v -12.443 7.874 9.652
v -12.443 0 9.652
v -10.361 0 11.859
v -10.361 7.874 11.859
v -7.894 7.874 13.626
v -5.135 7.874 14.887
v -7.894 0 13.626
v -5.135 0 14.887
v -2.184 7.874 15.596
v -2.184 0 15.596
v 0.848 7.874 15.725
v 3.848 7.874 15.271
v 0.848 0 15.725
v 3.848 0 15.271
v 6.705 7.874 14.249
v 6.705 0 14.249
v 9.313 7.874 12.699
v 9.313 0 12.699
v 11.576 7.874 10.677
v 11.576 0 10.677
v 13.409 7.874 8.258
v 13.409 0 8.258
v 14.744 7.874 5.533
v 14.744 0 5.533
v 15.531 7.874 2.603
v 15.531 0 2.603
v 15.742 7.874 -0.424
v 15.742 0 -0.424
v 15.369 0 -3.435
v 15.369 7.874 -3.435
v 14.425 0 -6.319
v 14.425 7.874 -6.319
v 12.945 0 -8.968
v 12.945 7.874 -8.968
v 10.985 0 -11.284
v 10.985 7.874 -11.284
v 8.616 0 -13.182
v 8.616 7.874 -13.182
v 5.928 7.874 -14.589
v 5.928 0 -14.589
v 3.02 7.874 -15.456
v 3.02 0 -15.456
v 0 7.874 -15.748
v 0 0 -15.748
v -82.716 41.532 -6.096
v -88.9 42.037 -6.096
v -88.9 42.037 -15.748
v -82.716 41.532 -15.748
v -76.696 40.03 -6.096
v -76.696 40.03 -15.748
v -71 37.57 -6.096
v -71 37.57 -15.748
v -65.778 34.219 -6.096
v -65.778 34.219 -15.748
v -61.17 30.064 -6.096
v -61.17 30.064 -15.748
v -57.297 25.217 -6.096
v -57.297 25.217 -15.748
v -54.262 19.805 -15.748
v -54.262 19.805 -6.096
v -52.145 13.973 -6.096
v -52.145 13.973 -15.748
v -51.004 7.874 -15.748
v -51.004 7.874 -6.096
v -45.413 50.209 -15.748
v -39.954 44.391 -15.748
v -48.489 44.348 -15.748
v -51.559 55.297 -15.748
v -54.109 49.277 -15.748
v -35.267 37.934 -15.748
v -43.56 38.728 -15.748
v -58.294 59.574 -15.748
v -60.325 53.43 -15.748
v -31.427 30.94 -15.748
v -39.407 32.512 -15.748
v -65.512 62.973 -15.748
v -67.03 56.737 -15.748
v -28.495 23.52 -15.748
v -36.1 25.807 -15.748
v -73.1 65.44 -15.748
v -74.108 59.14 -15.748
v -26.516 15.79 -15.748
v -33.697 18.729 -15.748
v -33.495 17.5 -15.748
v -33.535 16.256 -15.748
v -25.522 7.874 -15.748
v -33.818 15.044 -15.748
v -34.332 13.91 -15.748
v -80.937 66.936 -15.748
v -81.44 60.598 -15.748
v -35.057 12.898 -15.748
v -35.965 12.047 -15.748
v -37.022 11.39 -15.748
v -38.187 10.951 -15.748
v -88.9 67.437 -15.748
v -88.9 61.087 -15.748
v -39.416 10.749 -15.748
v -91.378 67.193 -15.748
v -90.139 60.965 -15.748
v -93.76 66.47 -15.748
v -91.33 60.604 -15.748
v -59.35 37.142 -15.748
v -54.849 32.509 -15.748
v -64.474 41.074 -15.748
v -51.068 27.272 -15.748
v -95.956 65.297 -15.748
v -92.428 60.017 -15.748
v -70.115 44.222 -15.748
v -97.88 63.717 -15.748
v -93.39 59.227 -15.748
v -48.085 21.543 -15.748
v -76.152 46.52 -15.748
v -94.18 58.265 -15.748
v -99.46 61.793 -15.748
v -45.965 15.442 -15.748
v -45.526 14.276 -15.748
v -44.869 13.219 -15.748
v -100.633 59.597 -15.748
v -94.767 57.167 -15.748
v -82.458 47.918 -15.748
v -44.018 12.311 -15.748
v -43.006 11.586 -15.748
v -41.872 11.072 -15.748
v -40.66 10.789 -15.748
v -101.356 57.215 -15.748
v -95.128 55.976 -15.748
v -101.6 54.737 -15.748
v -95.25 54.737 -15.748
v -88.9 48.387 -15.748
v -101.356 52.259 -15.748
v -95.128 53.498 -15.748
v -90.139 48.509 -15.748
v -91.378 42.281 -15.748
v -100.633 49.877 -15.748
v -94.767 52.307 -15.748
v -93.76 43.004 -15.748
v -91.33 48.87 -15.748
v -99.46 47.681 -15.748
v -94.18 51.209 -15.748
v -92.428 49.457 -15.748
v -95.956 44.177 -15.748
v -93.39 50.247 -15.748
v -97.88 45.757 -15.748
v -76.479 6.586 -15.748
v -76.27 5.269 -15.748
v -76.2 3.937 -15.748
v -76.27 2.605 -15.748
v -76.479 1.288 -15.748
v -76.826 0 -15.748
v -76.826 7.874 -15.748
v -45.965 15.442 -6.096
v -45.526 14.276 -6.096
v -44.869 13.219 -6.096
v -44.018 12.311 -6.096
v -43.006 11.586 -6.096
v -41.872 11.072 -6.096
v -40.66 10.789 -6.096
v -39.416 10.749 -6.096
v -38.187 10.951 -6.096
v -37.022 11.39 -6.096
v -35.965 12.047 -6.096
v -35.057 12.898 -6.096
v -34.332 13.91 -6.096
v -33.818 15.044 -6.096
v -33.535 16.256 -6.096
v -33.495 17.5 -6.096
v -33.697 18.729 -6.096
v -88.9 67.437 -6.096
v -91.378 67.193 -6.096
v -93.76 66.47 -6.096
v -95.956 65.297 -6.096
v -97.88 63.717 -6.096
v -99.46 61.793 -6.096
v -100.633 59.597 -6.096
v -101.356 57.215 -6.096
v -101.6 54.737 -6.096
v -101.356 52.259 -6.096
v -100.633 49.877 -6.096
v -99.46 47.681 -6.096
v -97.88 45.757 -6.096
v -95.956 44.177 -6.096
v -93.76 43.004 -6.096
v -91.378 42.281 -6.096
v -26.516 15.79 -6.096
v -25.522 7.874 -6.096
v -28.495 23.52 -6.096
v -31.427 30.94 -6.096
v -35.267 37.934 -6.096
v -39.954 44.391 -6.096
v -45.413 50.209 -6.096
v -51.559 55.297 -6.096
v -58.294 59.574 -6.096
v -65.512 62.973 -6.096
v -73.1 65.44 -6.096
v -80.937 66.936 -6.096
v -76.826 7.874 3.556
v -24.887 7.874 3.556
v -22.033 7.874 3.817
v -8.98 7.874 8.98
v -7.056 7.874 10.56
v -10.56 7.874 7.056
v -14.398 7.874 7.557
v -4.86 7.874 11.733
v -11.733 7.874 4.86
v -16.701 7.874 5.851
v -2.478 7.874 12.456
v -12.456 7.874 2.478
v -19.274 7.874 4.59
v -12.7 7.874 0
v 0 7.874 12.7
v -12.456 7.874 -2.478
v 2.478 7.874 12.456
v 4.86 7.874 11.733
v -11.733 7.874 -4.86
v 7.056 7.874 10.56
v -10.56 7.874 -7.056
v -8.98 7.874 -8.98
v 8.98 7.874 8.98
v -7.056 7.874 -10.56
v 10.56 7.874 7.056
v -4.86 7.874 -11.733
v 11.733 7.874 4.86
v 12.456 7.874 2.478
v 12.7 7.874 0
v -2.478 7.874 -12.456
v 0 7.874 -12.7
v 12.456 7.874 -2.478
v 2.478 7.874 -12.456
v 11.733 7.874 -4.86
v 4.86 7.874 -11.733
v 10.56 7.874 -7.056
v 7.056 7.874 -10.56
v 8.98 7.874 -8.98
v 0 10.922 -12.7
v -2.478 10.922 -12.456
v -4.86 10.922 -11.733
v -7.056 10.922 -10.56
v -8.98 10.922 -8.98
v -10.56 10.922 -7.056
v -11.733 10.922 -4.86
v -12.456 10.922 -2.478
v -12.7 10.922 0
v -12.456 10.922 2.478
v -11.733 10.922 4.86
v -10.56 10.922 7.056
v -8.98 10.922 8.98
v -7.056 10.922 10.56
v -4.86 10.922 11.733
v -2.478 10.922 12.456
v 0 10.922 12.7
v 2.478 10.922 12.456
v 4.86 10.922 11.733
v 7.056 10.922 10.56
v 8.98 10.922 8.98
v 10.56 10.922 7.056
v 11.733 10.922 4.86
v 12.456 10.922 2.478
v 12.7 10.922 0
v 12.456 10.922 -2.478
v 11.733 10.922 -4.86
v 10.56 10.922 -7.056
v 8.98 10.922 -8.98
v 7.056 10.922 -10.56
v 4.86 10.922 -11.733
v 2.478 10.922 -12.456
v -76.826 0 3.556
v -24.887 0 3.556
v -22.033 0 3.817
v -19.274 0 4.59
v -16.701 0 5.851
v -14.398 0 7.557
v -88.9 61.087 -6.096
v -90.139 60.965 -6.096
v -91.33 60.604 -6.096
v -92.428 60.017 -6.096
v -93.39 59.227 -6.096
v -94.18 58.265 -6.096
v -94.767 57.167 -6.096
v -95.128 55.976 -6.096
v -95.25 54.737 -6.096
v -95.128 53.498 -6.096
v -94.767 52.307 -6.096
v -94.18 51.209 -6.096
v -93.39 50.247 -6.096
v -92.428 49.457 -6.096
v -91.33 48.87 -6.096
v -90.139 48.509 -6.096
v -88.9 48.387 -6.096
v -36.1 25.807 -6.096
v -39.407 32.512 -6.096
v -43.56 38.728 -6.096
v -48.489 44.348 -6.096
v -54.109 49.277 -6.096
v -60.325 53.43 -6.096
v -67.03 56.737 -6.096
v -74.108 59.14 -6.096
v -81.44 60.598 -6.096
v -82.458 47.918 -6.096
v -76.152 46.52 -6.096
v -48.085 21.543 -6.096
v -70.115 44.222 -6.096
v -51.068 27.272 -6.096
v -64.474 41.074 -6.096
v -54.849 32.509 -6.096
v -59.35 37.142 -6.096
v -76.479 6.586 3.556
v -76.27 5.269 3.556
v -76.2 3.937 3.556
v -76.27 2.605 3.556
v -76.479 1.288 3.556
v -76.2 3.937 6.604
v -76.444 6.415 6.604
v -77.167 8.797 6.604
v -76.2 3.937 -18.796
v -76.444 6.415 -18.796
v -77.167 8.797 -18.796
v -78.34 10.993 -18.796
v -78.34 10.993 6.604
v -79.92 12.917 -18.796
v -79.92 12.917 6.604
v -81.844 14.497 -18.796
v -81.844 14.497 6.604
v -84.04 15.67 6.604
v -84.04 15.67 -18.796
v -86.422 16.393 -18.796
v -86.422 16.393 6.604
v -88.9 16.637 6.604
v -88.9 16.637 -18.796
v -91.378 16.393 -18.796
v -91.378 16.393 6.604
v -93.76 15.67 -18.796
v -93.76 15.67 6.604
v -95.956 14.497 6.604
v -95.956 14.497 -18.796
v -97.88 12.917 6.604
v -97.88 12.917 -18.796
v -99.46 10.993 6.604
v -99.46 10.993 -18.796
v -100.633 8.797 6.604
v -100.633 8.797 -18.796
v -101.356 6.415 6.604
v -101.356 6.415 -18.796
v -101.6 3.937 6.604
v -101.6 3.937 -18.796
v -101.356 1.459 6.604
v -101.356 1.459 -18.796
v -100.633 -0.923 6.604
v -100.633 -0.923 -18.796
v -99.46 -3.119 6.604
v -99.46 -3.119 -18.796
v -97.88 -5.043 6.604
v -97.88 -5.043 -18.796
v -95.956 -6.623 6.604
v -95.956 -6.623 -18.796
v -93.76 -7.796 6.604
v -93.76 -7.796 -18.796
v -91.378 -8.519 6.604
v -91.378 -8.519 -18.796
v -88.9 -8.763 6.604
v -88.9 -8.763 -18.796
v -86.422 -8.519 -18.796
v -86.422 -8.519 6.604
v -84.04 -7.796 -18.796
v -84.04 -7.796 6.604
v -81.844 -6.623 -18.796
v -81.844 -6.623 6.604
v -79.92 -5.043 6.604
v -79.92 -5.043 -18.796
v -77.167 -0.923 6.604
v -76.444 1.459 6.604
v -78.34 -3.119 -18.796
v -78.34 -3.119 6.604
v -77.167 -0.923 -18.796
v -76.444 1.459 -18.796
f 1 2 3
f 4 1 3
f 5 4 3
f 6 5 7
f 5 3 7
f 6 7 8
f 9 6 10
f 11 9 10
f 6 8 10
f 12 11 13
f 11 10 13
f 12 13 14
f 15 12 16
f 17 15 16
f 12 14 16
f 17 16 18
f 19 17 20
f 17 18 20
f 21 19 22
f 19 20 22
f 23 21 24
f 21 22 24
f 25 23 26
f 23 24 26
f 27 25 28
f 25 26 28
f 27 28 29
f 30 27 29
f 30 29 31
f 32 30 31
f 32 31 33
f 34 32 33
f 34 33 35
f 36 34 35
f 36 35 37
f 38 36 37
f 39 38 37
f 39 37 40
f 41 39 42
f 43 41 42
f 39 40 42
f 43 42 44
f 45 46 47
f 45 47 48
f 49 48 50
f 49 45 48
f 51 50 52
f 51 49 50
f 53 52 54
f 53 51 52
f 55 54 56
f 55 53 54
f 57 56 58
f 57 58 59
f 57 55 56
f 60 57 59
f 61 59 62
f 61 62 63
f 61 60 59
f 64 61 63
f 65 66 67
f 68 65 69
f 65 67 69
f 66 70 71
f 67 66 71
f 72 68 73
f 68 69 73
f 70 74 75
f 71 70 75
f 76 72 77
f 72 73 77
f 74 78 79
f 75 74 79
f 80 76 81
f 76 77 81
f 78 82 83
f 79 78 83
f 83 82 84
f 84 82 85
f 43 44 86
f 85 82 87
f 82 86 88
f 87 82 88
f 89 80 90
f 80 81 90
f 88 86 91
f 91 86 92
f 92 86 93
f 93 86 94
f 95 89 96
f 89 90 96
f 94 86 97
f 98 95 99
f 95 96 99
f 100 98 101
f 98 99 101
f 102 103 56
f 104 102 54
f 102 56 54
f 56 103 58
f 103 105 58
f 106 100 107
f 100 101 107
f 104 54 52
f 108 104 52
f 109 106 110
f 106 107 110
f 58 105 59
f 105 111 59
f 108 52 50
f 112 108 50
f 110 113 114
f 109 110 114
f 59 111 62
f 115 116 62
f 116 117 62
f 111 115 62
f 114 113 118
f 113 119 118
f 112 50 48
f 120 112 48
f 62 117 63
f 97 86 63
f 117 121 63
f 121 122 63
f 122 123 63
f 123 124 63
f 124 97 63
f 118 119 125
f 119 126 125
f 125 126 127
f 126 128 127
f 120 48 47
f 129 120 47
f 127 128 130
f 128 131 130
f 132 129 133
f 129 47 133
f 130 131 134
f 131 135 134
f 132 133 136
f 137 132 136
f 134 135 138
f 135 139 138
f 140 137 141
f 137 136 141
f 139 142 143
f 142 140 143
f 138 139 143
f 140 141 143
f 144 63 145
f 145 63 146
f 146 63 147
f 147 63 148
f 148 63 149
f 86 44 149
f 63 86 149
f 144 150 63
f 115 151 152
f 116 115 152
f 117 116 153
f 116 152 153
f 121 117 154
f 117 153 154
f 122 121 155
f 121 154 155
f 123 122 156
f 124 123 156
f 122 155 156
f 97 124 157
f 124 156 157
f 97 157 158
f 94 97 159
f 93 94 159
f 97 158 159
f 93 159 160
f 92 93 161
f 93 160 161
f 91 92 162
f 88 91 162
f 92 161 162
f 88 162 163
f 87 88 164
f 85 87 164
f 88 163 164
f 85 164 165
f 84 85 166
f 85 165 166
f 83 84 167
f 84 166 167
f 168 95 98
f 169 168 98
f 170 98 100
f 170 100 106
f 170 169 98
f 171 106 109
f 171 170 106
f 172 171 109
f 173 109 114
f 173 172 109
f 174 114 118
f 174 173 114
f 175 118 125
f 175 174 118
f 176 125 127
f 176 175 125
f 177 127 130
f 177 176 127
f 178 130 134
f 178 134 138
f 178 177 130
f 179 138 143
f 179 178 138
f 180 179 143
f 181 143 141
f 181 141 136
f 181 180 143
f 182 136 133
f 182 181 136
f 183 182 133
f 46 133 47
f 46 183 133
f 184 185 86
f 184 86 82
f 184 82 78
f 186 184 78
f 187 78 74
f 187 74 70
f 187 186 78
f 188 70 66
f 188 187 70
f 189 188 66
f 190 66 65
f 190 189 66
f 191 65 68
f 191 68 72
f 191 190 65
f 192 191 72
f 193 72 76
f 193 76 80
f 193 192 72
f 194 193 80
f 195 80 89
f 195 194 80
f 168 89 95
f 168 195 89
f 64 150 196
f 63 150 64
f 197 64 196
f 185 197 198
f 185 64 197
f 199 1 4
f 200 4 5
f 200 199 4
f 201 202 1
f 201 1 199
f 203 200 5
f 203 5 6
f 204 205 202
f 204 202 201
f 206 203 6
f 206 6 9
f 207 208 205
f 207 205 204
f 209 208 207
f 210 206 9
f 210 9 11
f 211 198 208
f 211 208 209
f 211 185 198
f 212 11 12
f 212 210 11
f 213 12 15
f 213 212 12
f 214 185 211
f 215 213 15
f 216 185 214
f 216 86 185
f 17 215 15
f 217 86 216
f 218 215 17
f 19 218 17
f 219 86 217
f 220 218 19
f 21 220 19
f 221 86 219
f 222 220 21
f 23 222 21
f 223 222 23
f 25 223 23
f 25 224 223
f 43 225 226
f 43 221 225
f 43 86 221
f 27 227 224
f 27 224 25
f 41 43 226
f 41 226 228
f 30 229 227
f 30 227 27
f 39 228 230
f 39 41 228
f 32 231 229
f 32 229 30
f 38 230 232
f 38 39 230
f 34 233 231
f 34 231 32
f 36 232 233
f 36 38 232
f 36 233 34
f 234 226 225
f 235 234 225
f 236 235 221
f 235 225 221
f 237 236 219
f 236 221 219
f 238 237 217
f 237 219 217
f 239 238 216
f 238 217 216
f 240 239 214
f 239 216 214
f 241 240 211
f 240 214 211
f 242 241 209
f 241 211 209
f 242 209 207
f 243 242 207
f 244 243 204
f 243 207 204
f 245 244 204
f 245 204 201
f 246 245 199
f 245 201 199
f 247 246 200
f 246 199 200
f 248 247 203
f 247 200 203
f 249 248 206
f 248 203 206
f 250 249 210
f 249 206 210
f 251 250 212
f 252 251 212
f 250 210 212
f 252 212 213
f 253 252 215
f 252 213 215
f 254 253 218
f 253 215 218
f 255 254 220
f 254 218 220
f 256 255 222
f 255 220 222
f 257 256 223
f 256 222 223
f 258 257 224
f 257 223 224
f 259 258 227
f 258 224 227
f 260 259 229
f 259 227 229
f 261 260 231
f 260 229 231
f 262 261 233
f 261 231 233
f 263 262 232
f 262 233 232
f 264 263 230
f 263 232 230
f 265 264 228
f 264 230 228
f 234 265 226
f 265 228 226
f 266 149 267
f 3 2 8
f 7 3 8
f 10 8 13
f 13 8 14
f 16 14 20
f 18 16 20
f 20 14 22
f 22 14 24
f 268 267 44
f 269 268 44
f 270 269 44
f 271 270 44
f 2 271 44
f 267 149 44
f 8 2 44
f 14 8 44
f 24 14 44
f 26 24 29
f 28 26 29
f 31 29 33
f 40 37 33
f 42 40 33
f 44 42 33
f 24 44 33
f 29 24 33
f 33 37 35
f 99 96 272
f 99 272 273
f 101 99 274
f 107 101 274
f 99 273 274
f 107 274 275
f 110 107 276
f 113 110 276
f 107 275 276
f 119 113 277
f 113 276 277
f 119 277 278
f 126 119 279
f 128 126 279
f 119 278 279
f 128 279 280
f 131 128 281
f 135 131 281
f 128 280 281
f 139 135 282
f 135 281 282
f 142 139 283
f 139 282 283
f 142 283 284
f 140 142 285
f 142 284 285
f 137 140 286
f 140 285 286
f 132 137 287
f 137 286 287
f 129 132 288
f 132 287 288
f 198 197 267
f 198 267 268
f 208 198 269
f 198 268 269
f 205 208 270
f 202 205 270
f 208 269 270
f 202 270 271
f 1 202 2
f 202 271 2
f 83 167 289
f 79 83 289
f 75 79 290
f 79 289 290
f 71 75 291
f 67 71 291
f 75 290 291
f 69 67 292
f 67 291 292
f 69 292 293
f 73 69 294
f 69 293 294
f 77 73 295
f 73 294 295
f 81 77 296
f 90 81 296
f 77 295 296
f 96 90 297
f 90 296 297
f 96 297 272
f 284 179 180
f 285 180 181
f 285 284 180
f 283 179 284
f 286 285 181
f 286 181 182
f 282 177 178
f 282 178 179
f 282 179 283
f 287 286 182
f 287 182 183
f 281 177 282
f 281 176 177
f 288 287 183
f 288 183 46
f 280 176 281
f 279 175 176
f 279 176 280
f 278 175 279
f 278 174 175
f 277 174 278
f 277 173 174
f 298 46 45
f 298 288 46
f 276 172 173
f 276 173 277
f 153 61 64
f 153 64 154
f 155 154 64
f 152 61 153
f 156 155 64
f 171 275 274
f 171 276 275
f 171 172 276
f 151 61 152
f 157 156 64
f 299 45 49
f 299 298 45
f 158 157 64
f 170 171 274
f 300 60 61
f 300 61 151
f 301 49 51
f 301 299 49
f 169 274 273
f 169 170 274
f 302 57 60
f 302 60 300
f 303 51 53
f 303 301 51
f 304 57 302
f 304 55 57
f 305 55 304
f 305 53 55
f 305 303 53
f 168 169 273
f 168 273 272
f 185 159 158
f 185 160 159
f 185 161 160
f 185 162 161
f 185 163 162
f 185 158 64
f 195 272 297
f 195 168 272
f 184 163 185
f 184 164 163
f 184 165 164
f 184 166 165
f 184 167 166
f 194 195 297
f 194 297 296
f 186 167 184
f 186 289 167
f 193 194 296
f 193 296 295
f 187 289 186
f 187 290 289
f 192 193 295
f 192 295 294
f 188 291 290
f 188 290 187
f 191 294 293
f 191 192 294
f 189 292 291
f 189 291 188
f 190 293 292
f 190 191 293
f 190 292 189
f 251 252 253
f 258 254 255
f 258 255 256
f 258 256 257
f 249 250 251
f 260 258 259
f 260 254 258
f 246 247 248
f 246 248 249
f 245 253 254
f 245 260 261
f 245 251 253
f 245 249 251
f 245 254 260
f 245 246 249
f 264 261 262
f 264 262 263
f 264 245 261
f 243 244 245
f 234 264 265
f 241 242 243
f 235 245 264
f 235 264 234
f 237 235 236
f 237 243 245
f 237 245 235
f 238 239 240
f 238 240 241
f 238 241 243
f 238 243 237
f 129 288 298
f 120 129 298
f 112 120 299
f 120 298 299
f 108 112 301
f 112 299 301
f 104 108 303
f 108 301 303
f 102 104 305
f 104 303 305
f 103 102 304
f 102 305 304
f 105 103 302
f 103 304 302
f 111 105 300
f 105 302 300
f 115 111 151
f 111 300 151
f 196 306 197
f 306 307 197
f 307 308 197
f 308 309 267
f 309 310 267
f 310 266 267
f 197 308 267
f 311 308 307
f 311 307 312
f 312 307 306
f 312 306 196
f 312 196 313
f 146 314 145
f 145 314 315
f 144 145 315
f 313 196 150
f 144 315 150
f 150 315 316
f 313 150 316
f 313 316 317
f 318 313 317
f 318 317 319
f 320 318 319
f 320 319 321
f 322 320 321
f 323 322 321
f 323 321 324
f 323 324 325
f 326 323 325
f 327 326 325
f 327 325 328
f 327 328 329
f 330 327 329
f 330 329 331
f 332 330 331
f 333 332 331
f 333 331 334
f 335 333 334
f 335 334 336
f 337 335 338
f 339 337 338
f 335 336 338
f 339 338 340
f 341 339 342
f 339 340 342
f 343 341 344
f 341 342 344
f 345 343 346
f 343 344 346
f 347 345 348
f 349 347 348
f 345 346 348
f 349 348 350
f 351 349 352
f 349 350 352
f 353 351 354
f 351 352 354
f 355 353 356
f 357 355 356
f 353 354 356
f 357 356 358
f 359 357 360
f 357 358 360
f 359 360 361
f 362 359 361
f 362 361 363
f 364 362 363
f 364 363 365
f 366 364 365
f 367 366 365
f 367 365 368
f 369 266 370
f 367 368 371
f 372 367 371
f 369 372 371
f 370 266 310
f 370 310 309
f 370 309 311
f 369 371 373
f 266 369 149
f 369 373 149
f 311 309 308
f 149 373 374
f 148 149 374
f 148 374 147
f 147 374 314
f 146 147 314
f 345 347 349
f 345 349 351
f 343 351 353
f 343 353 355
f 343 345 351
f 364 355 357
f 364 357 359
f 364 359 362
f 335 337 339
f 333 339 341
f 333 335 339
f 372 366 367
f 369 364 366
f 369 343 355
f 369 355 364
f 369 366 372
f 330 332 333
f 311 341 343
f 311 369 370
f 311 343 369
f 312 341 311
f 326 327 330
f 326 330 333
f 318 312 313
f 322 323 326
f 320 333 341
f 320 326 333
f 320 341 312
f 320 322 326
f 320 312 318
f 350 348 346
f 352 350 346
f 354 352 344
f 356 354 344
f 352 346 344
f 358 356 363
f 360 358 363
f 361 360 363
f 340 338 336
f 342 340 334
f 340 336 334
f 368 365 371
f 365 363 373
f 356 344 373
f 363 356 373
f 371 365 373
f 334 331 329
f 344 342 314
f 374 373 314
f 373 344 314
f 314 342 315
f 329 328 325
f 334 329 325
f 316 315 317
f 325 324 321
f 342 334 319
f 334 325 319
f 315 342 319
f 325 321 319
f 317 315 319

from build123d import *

# Parameters (mm, degrees)
SALIENTE_EXTRUIR1_DEPTH      = 7.874
SALIENTE_EXTRUIR2_DEPTH      = 12.7
SALIENTE_EXTRUIR2_DEPTH_BACK = 12.7
CROQUIS4_R                   = 12.7
SALIENTE_EXTRUIR4_DEPTH      = 9.652
CORTAR_EXTRUIR1_DEPTH        = 9.652
CROQUIS10_R                  = 12.7
SALIENTE_EXTRUIR5_DEPTH      = 3.048


with BuildPart() as part:
    # Croquis2 → Saliente-Extruir1 (new body)
    with BuildSketch(Plane(origin=(0, 0, 0), x_dir=(1, 0, 0), z_dir=(0, 1, 0))):
        with BuildLine():
            Line((0, 15.748), (-88.9, 15.748))
            Line((-88.9, 15.748), (-88.9, -3.556))
            Line((-88.9, -3.556), (-24.886815787, -3.556))
            ThreePointArc((-24.886815787, -3.556), (-17.958619485, -5.161878518), (-12.443407893, -9.652))
            ThreePointArc((-12.443407893, -9.652), (14.142121482, -6.928196302), (0, 15.748))
        make_face()
    extrude(amount=SALIENTE_EXTRUIR1_DEPTH)

    # Croquis4 → Saliente-Extruir2 (add, two sides: drawn at the far end of the back side and taken through both)
    with BuildSketch(Plane.XY.offset(-6.096).offset(-SALIENTE_EXTRUIR2_DEPTH_BACK)):
        with Locations((-88.9, 3.937)):
            Circle(CROQUIS4_R)
    extrude(amount=SALIENTE_EXTRUIR2_DEPTH + SALIENTE_EXTRUIR2_DEPTH_BACK)

    # Croquis8 → Saliente-Extruir4 (add)
    with BuildSketch(Plane.XY.offset(-6.096)):
        with BuildLine():
            Line((-51.003957581, 7.874), (-25.522164513, 7.874))
            ThreePointArc((-25.522164513, 7.874), (-45.412930083, 50.209289224), (-88.9, 67.437))
            ThreePointArc((-88.9, 67.437), (-101.6, 54.737), (-88.9, 42.037))
            ThreePointArc((-88.9, 42.037), (-63.389117028, 32.235495543), (-51.003957581, 7.874))
        make_face()
    extrude(amount=-SALIENTE_EXTRUIR4_DEPTH)

    # Croquis9 → Cortar-Extruir1 (cut)
    with BuildSketch(Plane.XY.offset(-6.096)):
        with BuildLine():
            ThreePointArc((-88.9, 61.087), (-95.25, 54.737), (-88.9, 48.387))
            ThreePointArc((-88.9, 48.387), (-61.840554481, 39.201555976), (-45.964597021, 15.441506555))
            ThreePointArc((-45.964597021, 15.441506555), (-38.187467088, 10.951378494), (-33.697339028, 18.728508428))
            ThreePointArc((-33.697339028, 18.728508428), (-54.109284332, 49.277143398), (-88.9, 61.087))
        make_face()
    extrude(amount=-CORTAR_EXTRUIR1_DEPTH, mode=Mode.SUBTRACT)

    # Croquis10 → Saliente-Extruir5 (add)
    with BuildSketch(Plane(origin=(0, 7.874, 0), x_dir=(1, 0, 0), z_dir=(0, 1, 0))):
        with Locations(Location((0, 0, 0), (0, 0, 90))):
            Circle(CROQUIS10_R)
    extrude(amount=SALIENTE_EXTRUIR5_DEPTH)


solid = part.part
